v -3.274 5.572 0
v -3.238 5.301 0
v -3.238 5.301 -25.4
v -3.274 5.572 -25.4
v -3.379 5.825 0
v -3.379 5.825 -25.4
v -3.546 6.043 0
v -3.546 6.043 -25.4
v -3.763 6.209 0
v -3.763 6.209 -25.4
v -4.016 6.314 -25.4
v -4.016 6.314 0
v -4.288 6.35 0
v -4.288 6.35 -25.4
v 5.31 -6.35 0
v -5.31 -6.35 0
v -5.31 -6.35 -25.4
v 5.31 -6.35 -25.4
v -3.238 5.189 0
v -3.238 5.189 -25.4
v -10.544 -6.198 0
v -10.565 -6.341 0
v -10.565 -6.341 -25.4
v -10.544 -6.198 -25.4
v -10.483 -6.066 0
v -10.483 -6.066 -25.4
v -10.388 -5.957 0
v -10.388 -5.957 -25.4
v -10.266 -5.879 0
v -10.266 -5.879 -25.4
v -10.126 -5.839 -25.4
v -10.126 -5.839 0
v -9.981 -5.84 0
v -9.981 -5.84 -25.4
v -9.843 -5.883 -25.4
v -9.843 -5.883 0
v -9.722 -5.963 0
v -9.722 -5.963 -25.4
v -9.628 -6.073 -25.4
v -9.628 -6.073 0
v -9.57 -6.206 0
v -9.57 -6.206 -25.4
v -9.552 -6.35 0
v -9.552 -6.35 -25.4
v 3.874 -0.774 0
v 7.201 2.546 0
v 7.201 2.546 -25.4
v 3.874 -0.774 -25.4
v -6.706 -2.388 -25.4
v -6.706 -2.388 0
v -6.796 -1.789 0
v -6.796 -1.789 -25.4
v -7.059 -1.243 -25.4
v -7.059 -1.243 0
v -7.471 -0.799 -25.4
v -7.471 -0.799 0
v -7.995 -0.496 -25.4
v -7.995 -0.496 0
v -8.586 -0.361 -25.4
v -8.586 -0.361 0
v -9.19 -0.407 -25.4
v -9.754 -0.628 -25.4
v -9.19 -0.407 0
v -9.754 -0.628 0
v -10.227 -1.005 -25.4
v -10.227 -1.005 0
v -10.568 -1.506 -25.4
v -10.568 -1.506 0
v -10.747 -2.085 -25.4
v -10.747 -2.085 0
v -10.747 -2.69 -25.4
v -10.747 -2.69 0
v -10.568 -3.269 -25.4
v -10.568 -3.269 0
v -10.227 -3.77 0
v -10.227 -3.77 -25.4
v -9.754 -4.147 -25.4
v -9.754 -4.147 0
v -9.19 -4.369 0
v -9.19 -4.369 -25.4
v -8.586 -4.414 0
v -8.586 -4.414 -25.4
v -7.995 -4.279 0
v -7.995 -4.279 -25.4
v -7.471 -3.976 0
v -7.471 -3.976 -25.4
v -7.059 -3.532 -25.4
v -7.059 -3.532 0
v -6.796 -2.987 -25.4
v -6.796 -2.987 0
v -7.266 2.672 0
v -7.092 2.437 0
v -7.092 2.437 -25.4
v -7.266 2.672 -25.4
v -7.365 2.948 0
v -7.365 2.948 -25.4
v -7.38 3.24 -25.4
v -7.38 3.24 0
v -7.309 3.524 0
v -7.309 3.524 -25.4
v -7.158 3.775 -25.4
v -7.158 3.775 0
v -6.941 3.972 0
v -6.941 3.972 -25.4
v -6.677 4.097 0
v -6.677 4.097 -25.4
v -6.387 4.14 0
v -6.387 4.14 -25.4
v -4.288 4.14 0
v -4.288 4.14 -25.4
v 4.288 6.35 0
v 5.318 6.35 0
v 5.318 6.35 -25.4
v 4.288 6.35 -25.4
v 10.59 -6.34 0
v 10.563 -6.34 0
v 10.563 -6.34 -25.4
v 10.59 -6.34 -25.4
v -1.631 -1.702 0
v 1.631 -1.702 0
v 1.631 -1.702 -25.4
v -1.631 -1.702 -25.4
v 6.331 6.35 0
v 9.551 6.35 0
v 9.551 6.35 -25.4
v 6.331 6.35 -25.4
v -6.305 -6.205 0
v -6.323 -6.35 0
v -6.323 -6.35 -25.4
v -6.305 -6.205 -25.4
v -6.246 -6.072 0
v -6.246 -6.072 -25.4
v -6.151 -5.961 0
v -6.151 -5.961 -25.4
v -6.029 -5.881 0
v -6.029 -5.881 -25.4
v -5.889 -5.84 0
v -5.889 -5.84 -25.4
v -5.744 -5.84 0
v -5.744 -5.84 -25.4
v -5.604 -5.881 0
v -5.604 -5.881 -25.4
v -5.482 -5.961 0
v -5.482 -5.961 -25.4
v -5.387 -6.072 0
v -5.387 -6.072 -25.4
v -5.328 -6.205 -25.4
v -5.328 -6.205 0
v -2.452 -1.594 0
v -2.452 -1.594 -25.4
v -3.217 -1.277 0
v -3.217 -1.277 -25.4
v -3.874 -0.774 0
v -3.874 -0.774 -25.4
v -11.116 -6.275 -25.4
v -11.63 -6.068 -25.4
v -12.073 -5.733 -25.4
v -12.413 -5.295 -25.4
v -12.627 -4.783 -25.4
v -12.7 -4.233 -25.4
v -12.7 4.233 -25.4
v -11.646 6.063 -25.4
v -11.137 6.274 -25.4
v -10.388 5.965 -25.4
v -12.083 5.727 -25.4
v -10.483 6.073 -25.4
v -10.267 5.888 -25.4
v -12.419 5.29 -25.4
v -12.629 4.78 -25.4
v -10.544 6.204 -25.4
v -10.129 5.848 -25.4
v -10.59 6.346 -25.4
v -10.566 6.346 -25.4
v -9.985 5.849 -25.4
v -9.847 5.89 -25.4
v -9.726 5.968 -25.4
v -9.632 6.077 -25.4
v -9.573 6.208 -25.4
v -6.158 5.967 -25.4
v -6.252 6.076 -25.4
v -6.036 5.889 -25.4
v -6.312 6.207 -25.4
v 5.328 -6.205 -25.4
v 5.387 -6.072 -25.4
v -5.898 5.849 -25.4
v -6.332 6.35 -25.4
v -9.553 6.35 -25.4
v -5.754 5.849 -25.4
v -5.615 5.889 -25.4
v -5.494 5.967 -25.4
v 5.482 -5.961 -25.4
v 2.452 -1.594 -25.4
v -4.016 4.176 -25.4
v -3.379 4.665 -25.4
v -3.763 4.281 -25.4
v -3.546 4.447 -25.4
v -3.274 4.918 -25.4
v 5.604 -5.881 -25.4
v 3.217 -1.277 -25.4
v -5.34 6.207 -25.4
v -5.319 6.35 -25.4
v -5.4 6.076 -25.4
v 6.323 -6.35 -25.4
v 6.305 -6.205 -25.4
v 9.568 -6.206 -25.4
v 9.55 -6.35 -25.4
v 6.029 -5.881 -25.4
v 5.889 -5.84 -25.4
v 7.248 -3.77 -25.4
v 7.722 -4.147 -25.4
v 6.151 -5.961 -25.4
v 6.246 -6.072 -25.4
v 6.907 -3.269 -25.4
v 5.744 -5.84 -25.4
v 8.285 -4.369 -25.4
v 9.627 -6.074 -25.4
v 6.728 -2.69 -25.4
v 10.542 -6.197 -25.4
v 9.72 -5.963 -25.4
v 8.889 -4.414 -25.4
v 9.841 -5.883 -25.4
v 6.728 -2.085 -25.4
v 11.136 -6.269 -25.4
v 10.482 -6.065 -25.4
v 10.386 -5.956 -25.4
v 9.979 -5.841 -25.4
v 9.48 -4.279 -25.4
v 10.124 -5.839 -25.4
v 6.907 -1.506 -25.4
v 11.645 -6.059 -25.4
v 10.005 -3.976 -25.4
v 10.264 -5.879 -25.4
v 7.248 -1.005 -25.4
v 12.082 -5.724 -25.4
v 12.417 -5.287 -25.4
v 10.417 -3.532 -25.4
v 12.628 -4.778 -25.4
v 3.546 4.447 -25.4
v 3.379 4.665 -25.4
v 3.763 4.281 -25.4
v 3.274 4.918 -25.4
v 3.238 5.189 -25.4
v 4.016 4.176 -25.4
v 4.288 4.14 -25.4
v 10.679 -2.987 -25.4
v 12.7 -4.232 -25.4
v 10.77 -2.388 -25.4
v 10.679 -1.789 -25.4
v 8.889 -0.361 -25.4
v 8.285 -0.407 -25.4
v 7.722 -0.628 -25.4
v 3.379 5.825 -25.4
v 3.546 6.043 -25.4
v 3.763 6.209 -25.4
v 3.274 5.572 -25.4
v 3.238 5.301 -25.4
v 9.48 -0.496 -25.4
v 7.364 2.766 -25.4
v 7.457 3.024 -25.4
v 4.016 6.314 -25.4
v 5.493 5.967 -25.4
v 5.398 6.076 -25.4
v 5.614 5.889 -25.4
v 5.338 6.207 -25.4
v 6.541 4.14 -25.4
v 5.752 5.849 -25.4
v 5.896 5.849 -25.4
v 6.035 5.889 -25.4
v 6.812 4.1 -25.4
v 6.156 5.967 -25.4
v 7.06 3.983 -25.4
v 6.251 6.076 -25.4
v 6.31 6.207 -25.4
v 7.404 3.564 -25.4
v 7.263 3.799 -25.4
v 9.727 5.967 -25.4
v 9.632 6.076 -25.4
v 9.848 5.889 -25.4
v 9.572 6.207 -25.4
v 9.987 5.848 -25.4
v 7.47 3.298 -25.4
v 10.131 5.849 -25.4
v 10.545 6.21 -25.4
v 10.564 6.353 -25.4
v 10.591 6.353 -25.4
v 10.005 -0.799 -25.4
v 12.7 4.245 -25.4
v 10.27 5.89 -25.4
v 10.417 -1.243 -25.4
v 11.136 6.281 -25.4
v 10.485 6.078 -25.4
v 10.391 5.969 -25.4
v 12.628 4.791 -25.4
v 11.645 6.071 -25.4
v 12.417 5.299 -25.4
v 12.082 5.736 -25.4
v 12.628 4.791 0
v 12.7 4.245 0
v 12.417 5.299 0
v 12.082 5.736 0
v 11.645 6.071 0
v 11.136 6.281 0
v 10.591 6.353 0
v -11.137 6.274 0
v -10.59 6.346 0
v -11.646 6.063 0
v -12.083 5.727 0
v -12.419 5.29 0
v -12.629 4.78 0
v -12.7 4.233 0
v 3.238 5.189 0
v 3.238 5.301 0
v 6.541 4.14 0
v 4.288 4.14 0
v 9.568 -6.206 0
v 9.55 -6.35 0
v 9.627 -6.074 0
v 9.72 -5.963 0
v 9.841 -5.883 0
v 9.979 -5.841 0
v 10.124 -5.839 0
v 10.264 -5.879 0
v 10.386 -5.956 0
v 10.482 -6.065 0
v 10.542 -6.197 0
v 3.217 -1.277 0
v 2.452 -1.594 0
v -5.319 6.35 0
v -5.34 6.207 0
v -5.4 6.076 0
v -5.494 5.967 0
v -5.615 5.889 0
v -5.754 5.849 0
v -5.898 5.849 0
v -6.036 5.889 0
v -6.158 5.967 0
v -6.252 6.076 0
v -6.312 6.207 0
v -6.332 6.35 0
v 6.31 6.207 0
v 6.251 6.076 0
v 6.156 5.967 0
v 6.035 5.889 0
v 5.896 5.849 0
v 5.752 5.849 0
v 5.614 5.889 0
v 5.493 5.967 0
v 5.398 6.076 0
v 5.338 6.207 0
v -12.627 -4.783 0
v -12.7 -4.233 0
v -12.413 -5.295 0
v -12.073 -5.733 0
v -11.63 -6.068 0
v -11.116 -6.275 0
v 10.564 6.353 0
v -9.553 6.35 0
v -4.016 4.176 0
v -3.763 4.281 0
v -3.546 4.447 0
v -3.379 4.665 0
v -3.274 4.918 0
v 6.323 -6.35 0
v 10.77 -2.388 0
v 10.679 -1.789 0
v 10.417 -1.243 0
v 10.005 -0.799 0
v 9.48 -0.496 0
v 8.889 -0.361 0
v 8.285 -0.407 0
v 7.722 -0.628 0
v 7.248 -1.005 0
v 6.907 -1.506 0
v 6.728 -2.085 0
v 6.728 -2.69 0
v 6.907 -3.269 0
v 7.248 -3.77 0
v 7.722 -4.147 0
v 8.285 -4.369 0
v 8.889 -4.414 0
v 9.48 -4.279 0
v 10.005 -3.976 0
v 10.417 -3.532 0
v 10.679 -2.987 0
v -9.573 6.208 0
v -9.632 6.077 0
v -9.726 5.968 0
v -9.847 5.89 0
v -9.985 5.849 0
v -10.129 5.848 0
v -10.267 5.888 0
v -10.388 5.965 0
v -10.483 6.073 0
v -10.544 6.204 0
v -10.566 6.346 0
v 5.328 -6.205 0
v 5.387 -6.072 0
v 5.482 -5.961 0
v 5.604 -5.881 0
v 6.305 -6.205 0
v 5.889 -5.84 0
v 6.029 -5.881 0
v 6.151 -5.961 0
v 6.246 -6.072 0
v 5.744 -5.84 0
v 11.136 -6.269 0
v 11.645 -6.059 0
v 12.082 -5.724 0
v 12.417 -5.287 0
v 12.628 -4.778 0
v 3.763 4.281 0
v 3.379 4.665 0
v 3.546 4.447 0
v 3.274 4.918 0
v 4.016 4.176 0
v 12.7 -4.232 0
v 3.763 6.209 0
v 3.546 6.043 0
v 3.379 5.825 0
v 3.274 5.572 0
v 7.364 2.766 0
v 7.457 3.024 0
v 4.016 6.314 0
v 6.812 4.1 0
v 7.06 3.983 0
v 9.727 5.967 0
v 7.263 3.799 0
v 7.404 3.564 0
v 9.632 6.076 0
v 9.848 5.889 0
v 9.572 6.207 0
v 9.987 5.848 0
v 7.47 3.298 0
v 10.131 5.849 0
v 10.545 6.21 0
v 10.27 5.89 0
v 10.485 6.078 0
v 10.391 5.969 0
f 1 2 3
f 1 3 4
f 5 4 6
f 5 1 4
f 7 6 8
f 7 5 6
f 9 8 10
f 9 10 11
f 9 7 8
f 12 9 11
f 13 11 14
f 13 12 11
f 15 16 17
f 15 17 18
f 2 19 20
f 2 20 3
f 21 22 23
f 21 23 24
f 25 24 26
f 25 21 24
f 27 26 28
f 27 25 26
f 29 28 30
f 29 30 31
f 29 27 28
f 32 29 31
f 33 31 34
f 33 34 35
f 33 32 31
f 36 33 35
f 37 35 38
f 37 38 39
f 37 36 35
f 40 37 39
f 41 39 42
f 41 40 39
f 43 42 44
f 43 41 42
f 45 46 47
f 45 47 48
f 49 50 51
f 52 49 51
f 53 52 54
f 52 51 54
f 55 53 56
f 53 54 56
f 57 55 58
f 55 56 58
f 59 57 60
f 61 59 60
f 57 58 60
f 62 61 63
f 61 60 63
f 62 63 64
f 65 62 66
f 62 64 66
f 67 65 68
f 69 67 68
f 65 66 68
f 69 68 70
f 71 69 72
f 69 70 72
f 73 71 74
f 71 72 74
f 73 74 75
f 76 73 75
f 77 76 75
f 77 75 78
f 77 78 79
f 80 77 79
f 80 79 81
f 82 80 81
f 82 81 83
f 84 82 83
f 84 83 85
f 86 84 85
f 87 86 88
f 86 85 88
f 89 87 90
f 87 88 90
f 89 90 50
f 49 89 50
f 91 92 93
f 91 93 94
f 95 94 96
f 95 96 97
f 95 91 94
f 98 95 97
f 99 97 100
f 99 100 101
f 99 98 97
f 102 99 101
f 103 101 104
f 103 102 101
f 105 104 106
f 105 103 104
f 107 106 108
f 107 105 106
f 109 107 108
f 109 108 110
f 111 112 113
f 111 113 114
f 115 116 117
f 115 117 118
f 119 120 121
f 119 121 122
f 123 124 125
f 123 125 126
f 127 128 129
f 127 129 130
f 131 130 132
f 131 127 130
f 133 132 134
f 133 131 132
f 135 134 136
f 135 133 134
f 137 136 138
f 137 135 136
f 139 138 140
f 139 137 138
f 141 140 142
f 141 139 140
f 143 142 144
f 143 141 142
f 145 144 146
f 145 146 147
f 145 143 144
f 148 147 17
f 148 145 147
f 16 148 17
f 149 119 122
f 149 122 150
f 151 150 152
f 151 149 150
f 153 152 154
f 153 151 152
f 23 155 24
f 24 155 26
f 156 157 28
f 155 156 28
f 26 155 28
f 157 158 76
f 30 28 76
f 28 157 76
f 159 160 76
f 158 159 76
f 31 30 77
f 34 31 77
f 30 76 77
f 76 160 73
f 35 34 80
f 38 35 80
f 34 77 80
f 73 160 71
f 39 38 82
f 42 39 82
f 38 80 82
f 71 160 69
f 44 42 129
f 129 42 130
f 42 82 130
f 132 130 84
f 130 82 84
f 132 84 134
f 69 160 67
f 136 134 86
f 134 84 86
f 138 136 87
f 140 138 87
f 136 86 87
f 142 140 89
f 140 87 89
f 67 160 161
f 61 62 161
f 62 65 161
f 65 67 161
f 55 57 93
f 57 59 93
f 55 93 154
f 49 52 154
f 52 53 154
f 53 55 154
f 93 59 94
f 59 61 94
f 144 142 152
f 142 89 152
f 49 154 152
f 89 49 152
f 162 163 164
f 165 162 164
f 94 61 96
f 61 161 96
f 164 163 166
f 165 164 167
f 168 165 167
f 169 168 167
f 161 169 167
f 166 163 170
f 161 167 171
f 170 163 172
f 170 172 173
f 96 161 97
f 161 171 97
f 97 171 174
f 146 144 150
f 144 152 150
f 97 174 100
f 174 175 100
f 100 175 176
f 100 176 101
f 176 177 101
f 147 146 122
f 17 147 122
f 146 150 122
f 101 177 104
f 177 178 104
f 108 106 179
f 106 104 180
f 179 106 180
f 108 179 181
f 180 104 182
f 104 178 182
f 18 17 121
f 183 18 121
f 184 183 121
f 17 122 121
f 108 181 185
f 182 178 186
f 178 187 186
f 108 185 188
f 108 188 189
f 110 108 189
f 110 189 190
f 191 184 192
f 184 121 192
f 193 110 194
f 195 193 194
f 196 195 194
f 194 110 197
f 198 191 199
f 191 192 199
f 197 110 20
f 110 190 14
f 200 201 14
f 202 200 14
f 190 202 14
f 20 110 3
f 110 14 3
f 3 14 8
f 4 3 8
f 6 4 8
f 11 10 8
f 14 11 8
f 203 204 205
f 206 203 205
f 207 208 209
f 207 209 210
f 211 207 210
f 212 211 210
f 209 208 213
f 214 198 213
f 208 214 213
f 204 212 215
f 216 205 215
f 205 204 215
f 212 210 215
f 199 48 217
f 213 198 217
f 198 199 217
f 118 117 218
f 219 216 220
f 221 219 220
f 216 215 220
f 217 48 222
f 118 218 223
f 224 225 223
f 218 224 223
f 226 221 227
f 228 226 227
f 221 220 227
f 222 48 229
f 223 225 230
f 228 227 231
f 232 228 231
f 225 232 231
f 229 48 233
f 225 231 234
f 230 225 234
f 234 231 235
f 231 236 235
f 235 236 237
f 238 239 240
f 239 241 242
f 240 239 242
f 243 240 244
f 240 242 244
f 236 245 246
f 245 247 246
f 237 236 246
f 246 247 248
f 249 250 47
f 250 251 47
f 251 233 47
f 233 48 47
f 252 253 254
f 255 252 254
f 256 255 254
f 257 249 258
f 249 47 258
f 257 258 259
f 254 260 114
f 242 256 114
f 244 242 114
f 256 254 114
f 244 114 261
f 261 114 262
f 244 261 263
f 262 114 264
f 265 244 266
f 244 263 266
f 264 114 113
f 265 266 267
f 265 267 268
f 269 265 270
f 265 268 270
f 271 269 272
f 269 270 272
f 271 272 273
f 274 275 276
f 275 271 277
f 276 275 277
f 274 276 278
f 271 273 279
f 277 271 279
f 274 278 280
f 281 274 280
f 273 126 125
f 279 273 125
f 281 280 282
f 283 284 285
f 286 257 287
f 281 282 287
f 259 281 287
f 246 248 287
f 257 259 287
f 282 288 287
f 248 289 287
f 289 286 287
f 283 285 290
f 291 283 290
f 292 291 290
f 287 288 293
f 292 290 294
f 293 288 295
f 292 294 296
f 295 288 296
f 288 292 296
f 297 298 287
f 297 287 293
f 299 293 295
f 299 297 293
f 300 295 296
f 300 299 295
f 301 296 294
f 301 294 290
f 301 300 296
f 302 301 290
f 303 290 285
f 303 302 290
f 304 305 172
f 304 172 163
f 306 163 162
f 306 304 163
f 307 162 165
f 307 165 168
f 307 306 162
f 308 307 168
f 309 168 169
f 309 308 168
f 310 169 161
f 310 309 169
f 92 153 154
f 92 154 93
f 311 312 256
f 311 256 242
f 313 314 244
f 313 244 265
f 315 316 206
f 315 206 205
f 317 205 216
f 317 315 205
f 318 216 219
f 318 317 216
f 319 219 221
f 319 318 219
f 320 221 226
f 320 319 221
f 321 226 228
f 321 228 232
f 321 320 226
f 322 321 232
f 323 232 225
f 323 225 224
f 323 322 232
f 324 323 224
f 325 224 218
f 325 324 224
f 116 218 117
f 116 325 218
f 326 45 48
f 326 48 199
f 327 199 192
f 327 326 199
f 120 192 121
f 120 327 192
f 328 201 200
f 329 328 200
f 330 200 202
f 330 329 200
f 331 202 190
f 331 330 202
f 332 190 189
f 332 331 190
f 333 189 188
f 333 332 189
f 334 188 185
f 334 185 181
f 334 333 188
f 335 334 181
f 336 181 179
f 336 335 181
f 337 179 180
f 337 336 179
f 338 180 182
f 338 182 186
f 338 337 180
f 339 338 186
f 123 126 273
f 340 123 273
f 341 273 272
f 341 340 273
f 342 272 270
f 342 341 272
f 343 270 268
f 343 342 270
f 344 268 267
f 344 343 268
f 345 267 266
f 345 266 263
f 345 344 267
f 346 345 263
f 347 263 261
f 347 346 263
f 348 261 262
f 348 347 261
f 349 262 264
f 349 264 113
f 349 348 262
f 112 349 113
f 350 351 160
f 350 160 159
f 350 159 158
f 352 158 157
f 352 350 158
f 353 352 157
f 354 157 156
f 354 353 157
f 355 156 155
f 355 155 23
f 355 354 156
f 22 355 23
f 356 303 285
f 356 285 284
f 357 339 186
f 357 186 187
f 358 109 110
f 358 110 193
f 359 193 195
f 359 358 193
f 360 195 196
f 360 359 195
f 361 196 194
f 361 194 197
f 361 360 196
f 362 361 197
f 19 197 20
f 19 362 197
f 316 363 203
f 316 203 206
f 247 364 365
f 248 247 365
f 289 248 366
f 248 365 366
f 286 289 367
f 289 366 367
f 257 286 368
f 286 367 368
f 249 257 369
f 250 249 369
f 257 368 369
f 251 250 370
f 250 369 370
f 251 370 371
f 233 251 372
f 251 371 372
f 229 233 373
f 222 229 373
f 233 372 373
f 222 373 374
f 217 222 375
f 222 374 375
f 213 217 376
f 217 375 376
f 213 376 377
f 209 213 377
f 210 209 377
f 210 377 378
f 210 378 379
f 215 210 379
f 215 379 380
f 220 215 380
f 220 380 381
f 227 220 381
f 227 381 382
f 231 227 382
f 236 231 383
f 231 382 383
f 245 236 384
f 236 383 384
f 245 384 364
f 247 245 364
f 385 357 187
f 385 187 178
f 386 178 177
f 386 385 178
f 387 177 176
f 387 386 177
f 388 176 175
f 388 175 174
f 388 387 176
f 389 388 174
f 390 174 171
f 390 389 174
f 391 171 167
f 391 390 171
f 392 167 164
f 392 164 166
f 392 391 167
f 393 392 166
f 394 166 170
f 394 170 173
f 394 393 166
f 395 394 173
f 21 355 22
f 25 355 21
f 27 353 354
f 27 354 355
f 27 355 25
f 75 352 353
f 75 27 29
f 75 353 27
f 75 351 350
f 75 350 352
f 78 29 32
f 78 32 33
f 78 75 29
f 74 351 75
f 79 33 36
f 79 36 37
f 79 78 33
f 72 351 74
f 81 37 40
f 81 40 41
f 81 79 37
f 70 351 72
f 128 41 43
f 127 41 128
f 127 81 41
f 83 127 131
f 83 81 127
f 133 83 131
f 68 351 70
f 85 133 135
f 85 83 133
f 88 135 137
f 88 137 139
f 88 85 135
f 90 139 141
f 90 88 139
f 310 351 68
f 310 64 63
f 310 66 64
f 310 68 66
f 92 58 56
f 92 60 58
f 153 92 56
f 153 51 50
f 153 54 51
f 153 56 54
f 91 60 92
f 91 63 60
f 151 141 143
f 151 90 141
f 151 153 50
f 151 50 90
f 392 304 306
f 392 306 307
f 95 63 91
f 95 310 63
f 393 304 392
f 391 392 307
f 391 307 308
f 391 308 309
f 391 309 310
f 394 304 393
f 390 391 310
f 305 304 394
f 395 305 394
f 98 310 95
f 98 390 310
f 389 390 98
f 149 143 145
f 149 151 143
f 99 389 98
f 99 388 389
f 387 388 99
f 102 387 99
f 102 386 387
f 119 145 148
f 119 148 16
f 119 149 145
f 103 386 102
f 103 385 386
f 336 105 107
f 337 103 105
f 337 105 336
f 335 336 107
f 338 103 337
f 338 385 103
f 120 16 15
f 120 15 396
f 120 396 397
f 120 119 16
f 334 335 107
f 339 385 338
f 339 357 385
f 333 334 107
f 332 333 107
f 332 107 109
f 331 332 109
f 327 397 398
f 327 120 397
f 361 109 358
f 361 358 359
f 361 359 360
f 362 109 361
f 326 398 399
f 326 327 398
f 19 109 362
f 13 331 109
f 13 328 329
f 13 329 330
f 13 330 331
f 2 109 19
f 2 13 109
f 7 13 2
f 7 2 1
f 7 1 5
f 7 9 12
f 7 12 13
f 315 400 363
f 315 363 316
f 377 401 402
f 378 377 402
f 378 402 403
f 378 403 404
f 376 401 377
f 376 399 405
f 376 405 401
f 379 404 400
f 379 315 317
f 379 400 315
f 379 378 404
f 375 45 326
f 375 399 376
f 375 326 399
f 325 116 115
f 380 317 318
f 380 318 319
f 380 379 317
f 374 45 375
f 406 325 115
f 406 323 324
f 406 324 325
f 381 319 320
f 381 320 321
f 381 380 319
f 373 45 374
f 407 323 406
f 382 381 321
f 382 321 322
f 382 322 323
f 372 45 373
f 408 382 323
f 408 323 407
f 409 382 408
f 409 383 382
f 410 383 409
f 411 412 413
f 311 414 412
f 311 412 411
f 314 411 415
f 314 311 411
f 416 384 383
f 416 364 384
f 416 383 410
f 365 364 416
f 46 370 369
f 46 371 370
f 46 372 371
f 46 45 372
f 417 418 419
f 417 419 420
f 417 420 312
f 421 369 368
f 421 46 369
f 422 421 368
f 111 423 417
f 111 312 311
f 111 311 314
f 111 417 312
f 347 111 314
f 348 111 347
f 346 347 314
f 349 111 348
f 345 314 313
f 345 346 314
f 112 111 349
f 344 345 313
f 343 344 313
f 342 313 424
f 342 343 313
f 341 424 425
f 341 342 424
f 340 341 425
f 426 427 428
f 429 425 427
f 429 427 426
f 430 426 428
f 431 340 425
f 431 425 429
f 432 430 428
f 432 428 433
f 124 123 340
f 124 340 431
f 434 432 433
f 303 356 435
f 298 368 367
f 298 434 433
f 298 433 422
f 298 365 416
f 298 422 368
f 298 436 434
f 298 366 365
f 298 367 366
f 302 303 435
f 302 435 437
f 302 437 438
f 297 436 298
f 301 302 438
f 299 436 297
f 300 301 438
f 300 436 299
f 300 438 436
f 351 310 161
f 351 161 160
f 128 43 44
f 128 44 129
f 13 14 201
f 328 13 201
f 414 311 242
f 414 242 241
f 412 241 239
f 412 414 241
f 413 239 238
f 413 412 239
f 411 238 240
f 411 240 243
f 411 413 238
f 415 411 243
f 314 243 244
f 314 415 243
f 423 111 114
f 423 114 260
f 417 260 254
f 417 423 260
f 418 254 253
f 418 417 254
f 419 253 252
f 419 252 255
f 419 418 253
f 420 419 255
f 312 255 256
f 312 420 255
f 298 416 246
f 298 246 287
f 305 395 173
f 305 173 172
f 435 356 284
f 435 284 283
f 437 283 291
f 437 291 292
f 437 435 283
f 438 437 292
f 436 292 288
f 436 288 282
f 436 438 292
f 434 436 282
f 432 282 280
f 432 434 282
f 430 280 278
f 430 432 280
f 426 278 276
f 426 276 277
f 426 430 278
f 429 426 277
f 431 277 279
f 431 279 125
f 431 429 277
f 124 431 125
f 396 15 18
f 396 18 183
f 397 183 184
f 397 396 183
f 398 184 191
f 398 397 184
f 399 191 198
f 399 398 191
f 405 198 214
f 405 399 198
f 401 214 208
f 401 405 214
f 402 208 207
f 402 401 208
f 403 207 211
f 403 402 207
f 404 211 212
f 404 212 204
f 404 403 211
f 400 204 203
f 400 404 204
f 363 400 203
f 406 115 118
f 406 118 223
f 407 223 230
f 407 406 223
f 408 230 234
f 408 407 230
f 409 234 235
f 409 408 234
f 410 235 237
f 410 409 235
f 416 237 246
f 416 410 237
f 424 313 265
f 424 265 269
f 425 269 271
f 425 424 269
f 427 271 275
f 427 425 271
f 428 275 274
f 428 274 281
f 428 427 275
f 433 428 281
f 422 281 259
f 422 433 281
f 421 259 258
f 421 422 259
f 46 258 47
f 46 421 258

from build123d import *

# Parameters (mm, degrees)
SKETCH1_R      = 2.032
EXTRUDE1_DEPTH = 25.4


with BuildPart() as part:
    # Sketch1 → Extrude1 (new body)
    with BuildSketch(Plane.XY):
        with BuildLine():
            Line((9.551093887, 6.35), (6.330982008, 6.35))
            ThreePointArc((6.330982008, 6.35), (5.824379679, 5.843397671), (5.31777735, 6.35))
            Line((5.31777735, 6.35), (4.28752, 6.35))
            ThreePointArc((4.28752, 6.35), (3.545750844, 6.042749156), (3.2385, 5.30098))
            Line((3.2385, 5.30098), (3.2385, 5.18922))
            ThreePointArc((3.2385, 5.18922), (3.545750844, 4.447450844), (4.28752, 4.1402))
            Line((4.28752, 4.1402), (6.541264932, 4.1402))
            ThreePointArc((6.541264932, 4.1402), (7.403778411, 3.563601238), (7.200674335, 2.54618079))
            Line((7.200674335, 2.54618079), (3.874487735, -0.773919123))
            ThreePointArc((3.874487735, -0.773919123), (2.845157282, -1.460673567), (1.631480681, -1.7018))
            Line((1.631480681, -1.7018), (-1.631480681, -1.7018))
            ThreePointArc((-1.631480681, -1.7018), (-2.845157282, -1.460673567), (-3.874487735, -0.773919123))
            Line((-3.874487735, -0.773919123), (-7.091634343, 2.437340333))
            ThreePointArc((-7.091634343, 2.437340333), (-7.30860647, 3.524230776), (-6.387200124, 4.1402))
            Line((-6.387200124, 4.1402), (-4.28752, 4.1402))
            ThreePointArc((-4.28752, 4.1402), (-3.545750844, 4.447450844), (-3.2385, 5.18922))
            Line((-3.2385, 5.18922), (-3.2385, 5.30098))
            ThreePointArc((-3.2385, 5.30098), (-3.545750844, 6.042749156), (-4.28752, 6.35))
            Line((-4.28752, 6.35), (-5.319235427, 6.35))
            ThreePointArc((-5.319235427, 6.35), (-5.825837756, 5.843397671), (-6.332440085, 6.35))
            Line((-6.332440085, 6.35), (-9.552501021, 6.35))
            ThreePointArc((-9.552501021, 6.35), (-10.056951984, 5.843402239), (-10.565687406, 6.345697309))
            Line((-10.565687406, 6.345697309), (-10.590059723, 6.345701253))
            ThreePointArc((-10.590059723, 6.345701253), (-12.083428447, 5.727229281), (-12.7, 4.233074923))
            Line((-12.7, 4.233074923), (-12.7, -4.233074923))
            ThreePointArc((-12.7, -4.233074923), (-12.072915167, -5.733409532), (-10.564685825, -6.341261141))
            ThreePointArc((-10.564685825, -6.341261141), (-10.053713904, -5.834598435), (-9.551557924, -6.35))
            Line((-9.551557924, -6.35), (-6.323021107, -6.35))
            ThreePointArc((-6.323021107, -6.35), (-5.816495529, -5.83457959), (-5.309969951, -6.35))
            Line((-5.309969951, -6.35), (5.309969951, -6.35))
            ThreePointArc((5.309969951, -6.35), (5.816495529, -5.83457959), (6.323021107, -6.35))
            Line((6.323021107, -6.35), (9.550160942, -6.35))
            ThreePointArc((9.550160942, -6.35), (10.051855758, -5.834602622), (10.563288148, -6.340338775))
            Line((10.563288148, -6.340338775), (10.589922543, -6.34049468))
            ThreePointArc((10.589922543, -6.34049468), (12.081868228, -5.723579066), (12.7, -4.23213684))
            Line((12.7, -4.23213684), (12.7, 4.244714967))
            ThreePointArc((12.7, 4.244714967), (12.082100067, 5.735925507), (10.590578068, 6.353073239))
            Line((10.590578068, 6.353073239), (10.564289268, 6.353065837))
            ThreePointArc((10.564289268, 6.353065837), (10.059229141, 5.84339999), (9.551093887, 6.35))
        make_face()
        with Locations((8.7376, -2.3876)):
            Circle(SKETCH1_R, mode=Mode.SUBTRACT)
        with Locations((-8.7376, -2.3876)):
            Circle(SKETCH1_R, mode=Mode.SUBTRACT)
    extrude(amount=-EXTRUDE1_DEPTH)


solid = part.part
